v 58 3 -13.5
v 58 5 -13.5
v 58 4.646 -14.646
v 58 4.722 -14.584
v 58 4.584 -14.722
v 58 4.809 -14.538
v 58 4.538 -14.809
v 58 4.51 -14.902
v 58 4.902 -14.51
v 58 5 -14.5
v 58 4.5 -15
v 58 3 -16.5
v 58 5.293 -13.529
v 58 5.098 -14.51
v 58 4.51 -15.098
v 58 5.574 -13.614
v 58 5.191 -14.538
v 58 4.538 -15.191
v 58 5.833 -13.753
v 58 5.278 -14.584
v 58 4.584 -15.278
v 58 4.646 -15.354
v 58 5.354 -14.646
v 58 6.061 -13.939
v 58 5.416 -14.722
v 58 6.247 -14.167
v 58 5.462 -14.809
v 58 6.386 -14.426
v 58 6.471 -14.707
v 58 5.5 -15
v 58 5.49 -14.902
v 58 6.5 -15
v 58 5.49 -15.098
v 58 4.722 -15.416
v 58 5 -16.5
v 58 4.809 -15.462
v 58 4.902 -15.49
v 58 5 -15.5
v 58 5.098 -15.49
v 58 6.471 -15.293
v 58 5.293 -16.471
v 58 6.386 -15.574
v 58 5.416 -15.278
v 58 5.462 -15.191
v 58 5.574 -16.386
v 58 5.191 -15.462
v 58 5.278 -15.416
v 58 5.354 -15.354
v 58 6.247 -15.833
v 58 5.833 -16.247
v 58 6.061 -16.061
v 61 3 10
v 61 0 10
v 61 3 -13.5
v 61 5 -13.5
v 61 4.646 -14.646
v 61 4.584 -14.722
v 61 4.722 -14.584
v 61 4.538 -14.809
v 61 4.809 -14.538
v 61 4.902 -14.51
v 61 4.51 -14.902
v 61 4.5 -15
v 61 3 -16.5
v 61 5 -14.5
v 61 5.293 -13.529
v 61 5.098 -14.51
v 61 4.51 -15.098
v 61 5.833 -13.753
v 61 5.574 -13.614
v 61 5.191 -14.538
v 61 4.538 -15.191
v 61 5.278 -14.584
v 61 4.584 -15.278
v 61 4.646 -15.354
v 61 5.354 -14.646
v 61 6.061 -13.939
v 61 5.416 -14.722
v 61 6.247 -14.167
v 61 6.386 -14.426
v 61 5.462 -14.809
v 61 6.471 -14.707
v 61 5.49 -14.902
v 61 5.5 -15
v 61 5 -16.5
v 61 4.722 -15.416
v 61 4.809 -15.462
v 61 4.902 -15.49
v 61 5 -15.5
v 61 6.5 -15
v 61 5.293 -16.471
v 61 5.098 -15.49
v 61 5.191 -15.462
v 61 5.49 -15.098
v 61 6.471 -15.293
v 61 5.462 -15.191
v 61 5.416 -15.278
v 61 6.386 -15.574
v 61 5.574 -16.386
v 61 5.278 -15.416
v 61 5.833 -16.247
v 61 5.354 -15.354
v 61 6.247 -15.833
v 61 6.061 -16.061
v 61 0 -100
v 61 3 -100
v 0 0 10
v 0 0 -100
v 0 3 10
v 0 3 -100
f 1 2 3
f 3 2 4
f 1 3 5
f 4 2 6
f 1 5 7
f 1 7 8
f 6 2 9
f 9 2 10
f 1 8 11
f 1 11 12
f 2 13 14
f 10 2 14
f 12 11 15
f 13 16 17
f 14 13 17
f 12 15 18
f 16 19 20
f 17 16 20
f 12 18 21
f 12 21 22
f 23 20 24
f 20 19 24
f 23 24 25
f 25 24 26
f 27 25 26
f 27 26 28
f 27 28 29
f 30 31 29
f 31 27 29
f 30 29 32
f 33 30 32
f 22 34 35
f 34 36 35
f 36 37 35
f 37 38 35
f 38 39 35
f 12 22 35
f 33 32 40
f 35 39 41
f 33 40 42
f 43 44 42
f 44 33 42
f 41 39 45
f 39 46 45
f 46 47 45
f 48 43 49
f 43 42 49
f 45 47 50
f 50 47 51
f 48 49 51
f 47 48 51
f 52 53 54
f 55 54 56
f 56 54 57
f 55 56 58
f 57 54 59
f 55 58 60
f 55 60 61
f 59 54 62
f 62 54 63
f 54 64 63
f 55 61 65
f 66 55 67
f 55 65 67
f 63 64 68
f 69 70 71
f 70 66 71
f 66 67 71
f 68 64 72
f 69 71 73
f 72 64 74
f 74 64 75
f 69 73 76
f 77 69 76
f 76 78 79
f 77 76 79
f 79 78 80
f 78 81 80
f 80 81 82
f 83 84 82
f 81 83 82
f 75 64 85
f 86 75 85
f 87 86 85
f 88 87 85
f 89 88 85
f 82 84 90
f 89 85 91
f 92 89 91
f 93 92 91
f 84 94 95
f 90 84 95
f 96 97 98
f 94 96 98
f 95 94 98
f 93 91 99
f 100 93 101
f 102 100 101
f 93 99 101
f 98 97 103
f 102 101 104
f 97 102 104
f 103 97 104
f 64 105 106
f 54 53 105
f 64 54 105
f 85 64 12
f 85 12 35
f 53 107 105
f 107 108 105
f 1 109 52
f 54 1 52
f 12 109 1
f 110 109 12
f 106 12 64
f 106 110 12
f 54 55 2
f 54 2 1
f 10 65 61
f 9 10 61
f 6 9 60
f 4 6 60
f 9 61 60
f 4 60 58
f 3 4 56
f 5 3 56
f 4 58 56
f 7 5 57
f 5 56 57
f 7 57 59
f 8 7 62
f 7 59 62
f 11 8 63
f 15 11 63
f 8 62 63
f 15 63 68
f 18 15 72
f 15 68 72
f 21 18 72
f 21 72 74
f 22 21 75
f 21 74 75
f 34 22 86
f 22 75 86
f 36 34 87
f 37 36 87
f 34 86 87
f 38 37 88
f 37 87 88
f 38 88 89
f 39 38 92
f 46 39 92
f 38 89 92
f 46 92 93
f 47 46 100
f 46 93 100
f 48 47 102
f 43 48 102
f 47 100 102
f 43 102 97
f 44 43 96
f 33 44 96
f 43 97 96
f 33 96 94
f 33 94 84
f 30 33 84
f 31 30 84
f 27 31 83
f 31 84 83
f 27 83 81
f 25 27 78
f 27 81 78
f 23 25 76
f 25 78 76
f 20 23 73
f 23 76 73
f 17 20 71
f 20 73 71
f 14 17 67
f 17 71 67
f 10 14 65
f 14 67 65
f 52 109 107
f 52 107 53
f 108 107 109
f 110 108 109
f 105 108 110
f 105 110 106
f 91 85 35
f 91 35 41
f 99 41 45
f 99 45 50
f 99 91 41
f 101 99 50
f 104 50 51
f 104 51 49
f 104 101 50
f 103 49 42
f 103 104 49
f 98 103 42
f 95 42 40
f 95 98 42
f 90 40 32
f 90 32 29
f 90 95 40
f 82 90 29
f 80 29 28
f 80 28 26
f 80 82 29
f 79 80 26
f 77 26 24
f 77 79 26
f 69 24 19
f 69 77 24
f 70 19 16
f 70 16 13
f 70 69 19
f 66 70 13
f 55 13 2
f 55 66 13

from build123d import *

# Parameters (mm, degrees)
SKETCH1_W           = 61
SKETCH1_H           = 100
BOSS_EXTRUDE1_DEPTH = 3
SKETCH4_W           = 61
SKETCH4_H           = 3
BOSS_EXTRUDE3_DEPTH = 10
SKETCH8_R           = 0.5
BOSS_EXTRUDE6_DEPTH = 3


with BuildPart() as part:
    # Sketch1 → Boss-Extrude1 (new body)
    with BuildSketch(Plane(origin=(0, 0, 0), x_dir=(1, 0, 0), z_dir=(0, 1, 0))):
        with Locations((30.5, 50)):
            Rectangle(SKETCH1_W, SKETCH1_H)
    extrude(amount=BOSS_EXTRUDE1_DEPTH)

    # Sketch4 → Boss-Extrude3 (add)
    with BuildSketch(Plane.XY):
        with Locations((30.5, 1.5)):
            Rectangle(SKETCH4_W, SKETCH4_H)
    extrude(amount=BOSS_EXTRUDE3_DEPTH)

    # Sketch8 → Boss-Extrude6 (add)
    with BuildSketch(Plane(origin=(61, 0, 0), x_dir=(0, 0, -1), z_dir=(1, 0, 0))):
        with BuildLine():
            Line((13.5, 3), (16.5, 3))
            Line((16.5, 3), (16.5, 5))
            ThreePointArc((16.5, 5), (15, 6.5), (13.5, 5))
            Line((13.5, 5), (13.5, 3))
        make_face()
        with Locations(Location((15, 5, 0), (0, 0, 180))):
            Circle(SKETCH8_R, mode=Mode.SUBTRACT)
    extrude(amount=-BOSS_EXTRUDE6_DEPTH)


solid = part.part
